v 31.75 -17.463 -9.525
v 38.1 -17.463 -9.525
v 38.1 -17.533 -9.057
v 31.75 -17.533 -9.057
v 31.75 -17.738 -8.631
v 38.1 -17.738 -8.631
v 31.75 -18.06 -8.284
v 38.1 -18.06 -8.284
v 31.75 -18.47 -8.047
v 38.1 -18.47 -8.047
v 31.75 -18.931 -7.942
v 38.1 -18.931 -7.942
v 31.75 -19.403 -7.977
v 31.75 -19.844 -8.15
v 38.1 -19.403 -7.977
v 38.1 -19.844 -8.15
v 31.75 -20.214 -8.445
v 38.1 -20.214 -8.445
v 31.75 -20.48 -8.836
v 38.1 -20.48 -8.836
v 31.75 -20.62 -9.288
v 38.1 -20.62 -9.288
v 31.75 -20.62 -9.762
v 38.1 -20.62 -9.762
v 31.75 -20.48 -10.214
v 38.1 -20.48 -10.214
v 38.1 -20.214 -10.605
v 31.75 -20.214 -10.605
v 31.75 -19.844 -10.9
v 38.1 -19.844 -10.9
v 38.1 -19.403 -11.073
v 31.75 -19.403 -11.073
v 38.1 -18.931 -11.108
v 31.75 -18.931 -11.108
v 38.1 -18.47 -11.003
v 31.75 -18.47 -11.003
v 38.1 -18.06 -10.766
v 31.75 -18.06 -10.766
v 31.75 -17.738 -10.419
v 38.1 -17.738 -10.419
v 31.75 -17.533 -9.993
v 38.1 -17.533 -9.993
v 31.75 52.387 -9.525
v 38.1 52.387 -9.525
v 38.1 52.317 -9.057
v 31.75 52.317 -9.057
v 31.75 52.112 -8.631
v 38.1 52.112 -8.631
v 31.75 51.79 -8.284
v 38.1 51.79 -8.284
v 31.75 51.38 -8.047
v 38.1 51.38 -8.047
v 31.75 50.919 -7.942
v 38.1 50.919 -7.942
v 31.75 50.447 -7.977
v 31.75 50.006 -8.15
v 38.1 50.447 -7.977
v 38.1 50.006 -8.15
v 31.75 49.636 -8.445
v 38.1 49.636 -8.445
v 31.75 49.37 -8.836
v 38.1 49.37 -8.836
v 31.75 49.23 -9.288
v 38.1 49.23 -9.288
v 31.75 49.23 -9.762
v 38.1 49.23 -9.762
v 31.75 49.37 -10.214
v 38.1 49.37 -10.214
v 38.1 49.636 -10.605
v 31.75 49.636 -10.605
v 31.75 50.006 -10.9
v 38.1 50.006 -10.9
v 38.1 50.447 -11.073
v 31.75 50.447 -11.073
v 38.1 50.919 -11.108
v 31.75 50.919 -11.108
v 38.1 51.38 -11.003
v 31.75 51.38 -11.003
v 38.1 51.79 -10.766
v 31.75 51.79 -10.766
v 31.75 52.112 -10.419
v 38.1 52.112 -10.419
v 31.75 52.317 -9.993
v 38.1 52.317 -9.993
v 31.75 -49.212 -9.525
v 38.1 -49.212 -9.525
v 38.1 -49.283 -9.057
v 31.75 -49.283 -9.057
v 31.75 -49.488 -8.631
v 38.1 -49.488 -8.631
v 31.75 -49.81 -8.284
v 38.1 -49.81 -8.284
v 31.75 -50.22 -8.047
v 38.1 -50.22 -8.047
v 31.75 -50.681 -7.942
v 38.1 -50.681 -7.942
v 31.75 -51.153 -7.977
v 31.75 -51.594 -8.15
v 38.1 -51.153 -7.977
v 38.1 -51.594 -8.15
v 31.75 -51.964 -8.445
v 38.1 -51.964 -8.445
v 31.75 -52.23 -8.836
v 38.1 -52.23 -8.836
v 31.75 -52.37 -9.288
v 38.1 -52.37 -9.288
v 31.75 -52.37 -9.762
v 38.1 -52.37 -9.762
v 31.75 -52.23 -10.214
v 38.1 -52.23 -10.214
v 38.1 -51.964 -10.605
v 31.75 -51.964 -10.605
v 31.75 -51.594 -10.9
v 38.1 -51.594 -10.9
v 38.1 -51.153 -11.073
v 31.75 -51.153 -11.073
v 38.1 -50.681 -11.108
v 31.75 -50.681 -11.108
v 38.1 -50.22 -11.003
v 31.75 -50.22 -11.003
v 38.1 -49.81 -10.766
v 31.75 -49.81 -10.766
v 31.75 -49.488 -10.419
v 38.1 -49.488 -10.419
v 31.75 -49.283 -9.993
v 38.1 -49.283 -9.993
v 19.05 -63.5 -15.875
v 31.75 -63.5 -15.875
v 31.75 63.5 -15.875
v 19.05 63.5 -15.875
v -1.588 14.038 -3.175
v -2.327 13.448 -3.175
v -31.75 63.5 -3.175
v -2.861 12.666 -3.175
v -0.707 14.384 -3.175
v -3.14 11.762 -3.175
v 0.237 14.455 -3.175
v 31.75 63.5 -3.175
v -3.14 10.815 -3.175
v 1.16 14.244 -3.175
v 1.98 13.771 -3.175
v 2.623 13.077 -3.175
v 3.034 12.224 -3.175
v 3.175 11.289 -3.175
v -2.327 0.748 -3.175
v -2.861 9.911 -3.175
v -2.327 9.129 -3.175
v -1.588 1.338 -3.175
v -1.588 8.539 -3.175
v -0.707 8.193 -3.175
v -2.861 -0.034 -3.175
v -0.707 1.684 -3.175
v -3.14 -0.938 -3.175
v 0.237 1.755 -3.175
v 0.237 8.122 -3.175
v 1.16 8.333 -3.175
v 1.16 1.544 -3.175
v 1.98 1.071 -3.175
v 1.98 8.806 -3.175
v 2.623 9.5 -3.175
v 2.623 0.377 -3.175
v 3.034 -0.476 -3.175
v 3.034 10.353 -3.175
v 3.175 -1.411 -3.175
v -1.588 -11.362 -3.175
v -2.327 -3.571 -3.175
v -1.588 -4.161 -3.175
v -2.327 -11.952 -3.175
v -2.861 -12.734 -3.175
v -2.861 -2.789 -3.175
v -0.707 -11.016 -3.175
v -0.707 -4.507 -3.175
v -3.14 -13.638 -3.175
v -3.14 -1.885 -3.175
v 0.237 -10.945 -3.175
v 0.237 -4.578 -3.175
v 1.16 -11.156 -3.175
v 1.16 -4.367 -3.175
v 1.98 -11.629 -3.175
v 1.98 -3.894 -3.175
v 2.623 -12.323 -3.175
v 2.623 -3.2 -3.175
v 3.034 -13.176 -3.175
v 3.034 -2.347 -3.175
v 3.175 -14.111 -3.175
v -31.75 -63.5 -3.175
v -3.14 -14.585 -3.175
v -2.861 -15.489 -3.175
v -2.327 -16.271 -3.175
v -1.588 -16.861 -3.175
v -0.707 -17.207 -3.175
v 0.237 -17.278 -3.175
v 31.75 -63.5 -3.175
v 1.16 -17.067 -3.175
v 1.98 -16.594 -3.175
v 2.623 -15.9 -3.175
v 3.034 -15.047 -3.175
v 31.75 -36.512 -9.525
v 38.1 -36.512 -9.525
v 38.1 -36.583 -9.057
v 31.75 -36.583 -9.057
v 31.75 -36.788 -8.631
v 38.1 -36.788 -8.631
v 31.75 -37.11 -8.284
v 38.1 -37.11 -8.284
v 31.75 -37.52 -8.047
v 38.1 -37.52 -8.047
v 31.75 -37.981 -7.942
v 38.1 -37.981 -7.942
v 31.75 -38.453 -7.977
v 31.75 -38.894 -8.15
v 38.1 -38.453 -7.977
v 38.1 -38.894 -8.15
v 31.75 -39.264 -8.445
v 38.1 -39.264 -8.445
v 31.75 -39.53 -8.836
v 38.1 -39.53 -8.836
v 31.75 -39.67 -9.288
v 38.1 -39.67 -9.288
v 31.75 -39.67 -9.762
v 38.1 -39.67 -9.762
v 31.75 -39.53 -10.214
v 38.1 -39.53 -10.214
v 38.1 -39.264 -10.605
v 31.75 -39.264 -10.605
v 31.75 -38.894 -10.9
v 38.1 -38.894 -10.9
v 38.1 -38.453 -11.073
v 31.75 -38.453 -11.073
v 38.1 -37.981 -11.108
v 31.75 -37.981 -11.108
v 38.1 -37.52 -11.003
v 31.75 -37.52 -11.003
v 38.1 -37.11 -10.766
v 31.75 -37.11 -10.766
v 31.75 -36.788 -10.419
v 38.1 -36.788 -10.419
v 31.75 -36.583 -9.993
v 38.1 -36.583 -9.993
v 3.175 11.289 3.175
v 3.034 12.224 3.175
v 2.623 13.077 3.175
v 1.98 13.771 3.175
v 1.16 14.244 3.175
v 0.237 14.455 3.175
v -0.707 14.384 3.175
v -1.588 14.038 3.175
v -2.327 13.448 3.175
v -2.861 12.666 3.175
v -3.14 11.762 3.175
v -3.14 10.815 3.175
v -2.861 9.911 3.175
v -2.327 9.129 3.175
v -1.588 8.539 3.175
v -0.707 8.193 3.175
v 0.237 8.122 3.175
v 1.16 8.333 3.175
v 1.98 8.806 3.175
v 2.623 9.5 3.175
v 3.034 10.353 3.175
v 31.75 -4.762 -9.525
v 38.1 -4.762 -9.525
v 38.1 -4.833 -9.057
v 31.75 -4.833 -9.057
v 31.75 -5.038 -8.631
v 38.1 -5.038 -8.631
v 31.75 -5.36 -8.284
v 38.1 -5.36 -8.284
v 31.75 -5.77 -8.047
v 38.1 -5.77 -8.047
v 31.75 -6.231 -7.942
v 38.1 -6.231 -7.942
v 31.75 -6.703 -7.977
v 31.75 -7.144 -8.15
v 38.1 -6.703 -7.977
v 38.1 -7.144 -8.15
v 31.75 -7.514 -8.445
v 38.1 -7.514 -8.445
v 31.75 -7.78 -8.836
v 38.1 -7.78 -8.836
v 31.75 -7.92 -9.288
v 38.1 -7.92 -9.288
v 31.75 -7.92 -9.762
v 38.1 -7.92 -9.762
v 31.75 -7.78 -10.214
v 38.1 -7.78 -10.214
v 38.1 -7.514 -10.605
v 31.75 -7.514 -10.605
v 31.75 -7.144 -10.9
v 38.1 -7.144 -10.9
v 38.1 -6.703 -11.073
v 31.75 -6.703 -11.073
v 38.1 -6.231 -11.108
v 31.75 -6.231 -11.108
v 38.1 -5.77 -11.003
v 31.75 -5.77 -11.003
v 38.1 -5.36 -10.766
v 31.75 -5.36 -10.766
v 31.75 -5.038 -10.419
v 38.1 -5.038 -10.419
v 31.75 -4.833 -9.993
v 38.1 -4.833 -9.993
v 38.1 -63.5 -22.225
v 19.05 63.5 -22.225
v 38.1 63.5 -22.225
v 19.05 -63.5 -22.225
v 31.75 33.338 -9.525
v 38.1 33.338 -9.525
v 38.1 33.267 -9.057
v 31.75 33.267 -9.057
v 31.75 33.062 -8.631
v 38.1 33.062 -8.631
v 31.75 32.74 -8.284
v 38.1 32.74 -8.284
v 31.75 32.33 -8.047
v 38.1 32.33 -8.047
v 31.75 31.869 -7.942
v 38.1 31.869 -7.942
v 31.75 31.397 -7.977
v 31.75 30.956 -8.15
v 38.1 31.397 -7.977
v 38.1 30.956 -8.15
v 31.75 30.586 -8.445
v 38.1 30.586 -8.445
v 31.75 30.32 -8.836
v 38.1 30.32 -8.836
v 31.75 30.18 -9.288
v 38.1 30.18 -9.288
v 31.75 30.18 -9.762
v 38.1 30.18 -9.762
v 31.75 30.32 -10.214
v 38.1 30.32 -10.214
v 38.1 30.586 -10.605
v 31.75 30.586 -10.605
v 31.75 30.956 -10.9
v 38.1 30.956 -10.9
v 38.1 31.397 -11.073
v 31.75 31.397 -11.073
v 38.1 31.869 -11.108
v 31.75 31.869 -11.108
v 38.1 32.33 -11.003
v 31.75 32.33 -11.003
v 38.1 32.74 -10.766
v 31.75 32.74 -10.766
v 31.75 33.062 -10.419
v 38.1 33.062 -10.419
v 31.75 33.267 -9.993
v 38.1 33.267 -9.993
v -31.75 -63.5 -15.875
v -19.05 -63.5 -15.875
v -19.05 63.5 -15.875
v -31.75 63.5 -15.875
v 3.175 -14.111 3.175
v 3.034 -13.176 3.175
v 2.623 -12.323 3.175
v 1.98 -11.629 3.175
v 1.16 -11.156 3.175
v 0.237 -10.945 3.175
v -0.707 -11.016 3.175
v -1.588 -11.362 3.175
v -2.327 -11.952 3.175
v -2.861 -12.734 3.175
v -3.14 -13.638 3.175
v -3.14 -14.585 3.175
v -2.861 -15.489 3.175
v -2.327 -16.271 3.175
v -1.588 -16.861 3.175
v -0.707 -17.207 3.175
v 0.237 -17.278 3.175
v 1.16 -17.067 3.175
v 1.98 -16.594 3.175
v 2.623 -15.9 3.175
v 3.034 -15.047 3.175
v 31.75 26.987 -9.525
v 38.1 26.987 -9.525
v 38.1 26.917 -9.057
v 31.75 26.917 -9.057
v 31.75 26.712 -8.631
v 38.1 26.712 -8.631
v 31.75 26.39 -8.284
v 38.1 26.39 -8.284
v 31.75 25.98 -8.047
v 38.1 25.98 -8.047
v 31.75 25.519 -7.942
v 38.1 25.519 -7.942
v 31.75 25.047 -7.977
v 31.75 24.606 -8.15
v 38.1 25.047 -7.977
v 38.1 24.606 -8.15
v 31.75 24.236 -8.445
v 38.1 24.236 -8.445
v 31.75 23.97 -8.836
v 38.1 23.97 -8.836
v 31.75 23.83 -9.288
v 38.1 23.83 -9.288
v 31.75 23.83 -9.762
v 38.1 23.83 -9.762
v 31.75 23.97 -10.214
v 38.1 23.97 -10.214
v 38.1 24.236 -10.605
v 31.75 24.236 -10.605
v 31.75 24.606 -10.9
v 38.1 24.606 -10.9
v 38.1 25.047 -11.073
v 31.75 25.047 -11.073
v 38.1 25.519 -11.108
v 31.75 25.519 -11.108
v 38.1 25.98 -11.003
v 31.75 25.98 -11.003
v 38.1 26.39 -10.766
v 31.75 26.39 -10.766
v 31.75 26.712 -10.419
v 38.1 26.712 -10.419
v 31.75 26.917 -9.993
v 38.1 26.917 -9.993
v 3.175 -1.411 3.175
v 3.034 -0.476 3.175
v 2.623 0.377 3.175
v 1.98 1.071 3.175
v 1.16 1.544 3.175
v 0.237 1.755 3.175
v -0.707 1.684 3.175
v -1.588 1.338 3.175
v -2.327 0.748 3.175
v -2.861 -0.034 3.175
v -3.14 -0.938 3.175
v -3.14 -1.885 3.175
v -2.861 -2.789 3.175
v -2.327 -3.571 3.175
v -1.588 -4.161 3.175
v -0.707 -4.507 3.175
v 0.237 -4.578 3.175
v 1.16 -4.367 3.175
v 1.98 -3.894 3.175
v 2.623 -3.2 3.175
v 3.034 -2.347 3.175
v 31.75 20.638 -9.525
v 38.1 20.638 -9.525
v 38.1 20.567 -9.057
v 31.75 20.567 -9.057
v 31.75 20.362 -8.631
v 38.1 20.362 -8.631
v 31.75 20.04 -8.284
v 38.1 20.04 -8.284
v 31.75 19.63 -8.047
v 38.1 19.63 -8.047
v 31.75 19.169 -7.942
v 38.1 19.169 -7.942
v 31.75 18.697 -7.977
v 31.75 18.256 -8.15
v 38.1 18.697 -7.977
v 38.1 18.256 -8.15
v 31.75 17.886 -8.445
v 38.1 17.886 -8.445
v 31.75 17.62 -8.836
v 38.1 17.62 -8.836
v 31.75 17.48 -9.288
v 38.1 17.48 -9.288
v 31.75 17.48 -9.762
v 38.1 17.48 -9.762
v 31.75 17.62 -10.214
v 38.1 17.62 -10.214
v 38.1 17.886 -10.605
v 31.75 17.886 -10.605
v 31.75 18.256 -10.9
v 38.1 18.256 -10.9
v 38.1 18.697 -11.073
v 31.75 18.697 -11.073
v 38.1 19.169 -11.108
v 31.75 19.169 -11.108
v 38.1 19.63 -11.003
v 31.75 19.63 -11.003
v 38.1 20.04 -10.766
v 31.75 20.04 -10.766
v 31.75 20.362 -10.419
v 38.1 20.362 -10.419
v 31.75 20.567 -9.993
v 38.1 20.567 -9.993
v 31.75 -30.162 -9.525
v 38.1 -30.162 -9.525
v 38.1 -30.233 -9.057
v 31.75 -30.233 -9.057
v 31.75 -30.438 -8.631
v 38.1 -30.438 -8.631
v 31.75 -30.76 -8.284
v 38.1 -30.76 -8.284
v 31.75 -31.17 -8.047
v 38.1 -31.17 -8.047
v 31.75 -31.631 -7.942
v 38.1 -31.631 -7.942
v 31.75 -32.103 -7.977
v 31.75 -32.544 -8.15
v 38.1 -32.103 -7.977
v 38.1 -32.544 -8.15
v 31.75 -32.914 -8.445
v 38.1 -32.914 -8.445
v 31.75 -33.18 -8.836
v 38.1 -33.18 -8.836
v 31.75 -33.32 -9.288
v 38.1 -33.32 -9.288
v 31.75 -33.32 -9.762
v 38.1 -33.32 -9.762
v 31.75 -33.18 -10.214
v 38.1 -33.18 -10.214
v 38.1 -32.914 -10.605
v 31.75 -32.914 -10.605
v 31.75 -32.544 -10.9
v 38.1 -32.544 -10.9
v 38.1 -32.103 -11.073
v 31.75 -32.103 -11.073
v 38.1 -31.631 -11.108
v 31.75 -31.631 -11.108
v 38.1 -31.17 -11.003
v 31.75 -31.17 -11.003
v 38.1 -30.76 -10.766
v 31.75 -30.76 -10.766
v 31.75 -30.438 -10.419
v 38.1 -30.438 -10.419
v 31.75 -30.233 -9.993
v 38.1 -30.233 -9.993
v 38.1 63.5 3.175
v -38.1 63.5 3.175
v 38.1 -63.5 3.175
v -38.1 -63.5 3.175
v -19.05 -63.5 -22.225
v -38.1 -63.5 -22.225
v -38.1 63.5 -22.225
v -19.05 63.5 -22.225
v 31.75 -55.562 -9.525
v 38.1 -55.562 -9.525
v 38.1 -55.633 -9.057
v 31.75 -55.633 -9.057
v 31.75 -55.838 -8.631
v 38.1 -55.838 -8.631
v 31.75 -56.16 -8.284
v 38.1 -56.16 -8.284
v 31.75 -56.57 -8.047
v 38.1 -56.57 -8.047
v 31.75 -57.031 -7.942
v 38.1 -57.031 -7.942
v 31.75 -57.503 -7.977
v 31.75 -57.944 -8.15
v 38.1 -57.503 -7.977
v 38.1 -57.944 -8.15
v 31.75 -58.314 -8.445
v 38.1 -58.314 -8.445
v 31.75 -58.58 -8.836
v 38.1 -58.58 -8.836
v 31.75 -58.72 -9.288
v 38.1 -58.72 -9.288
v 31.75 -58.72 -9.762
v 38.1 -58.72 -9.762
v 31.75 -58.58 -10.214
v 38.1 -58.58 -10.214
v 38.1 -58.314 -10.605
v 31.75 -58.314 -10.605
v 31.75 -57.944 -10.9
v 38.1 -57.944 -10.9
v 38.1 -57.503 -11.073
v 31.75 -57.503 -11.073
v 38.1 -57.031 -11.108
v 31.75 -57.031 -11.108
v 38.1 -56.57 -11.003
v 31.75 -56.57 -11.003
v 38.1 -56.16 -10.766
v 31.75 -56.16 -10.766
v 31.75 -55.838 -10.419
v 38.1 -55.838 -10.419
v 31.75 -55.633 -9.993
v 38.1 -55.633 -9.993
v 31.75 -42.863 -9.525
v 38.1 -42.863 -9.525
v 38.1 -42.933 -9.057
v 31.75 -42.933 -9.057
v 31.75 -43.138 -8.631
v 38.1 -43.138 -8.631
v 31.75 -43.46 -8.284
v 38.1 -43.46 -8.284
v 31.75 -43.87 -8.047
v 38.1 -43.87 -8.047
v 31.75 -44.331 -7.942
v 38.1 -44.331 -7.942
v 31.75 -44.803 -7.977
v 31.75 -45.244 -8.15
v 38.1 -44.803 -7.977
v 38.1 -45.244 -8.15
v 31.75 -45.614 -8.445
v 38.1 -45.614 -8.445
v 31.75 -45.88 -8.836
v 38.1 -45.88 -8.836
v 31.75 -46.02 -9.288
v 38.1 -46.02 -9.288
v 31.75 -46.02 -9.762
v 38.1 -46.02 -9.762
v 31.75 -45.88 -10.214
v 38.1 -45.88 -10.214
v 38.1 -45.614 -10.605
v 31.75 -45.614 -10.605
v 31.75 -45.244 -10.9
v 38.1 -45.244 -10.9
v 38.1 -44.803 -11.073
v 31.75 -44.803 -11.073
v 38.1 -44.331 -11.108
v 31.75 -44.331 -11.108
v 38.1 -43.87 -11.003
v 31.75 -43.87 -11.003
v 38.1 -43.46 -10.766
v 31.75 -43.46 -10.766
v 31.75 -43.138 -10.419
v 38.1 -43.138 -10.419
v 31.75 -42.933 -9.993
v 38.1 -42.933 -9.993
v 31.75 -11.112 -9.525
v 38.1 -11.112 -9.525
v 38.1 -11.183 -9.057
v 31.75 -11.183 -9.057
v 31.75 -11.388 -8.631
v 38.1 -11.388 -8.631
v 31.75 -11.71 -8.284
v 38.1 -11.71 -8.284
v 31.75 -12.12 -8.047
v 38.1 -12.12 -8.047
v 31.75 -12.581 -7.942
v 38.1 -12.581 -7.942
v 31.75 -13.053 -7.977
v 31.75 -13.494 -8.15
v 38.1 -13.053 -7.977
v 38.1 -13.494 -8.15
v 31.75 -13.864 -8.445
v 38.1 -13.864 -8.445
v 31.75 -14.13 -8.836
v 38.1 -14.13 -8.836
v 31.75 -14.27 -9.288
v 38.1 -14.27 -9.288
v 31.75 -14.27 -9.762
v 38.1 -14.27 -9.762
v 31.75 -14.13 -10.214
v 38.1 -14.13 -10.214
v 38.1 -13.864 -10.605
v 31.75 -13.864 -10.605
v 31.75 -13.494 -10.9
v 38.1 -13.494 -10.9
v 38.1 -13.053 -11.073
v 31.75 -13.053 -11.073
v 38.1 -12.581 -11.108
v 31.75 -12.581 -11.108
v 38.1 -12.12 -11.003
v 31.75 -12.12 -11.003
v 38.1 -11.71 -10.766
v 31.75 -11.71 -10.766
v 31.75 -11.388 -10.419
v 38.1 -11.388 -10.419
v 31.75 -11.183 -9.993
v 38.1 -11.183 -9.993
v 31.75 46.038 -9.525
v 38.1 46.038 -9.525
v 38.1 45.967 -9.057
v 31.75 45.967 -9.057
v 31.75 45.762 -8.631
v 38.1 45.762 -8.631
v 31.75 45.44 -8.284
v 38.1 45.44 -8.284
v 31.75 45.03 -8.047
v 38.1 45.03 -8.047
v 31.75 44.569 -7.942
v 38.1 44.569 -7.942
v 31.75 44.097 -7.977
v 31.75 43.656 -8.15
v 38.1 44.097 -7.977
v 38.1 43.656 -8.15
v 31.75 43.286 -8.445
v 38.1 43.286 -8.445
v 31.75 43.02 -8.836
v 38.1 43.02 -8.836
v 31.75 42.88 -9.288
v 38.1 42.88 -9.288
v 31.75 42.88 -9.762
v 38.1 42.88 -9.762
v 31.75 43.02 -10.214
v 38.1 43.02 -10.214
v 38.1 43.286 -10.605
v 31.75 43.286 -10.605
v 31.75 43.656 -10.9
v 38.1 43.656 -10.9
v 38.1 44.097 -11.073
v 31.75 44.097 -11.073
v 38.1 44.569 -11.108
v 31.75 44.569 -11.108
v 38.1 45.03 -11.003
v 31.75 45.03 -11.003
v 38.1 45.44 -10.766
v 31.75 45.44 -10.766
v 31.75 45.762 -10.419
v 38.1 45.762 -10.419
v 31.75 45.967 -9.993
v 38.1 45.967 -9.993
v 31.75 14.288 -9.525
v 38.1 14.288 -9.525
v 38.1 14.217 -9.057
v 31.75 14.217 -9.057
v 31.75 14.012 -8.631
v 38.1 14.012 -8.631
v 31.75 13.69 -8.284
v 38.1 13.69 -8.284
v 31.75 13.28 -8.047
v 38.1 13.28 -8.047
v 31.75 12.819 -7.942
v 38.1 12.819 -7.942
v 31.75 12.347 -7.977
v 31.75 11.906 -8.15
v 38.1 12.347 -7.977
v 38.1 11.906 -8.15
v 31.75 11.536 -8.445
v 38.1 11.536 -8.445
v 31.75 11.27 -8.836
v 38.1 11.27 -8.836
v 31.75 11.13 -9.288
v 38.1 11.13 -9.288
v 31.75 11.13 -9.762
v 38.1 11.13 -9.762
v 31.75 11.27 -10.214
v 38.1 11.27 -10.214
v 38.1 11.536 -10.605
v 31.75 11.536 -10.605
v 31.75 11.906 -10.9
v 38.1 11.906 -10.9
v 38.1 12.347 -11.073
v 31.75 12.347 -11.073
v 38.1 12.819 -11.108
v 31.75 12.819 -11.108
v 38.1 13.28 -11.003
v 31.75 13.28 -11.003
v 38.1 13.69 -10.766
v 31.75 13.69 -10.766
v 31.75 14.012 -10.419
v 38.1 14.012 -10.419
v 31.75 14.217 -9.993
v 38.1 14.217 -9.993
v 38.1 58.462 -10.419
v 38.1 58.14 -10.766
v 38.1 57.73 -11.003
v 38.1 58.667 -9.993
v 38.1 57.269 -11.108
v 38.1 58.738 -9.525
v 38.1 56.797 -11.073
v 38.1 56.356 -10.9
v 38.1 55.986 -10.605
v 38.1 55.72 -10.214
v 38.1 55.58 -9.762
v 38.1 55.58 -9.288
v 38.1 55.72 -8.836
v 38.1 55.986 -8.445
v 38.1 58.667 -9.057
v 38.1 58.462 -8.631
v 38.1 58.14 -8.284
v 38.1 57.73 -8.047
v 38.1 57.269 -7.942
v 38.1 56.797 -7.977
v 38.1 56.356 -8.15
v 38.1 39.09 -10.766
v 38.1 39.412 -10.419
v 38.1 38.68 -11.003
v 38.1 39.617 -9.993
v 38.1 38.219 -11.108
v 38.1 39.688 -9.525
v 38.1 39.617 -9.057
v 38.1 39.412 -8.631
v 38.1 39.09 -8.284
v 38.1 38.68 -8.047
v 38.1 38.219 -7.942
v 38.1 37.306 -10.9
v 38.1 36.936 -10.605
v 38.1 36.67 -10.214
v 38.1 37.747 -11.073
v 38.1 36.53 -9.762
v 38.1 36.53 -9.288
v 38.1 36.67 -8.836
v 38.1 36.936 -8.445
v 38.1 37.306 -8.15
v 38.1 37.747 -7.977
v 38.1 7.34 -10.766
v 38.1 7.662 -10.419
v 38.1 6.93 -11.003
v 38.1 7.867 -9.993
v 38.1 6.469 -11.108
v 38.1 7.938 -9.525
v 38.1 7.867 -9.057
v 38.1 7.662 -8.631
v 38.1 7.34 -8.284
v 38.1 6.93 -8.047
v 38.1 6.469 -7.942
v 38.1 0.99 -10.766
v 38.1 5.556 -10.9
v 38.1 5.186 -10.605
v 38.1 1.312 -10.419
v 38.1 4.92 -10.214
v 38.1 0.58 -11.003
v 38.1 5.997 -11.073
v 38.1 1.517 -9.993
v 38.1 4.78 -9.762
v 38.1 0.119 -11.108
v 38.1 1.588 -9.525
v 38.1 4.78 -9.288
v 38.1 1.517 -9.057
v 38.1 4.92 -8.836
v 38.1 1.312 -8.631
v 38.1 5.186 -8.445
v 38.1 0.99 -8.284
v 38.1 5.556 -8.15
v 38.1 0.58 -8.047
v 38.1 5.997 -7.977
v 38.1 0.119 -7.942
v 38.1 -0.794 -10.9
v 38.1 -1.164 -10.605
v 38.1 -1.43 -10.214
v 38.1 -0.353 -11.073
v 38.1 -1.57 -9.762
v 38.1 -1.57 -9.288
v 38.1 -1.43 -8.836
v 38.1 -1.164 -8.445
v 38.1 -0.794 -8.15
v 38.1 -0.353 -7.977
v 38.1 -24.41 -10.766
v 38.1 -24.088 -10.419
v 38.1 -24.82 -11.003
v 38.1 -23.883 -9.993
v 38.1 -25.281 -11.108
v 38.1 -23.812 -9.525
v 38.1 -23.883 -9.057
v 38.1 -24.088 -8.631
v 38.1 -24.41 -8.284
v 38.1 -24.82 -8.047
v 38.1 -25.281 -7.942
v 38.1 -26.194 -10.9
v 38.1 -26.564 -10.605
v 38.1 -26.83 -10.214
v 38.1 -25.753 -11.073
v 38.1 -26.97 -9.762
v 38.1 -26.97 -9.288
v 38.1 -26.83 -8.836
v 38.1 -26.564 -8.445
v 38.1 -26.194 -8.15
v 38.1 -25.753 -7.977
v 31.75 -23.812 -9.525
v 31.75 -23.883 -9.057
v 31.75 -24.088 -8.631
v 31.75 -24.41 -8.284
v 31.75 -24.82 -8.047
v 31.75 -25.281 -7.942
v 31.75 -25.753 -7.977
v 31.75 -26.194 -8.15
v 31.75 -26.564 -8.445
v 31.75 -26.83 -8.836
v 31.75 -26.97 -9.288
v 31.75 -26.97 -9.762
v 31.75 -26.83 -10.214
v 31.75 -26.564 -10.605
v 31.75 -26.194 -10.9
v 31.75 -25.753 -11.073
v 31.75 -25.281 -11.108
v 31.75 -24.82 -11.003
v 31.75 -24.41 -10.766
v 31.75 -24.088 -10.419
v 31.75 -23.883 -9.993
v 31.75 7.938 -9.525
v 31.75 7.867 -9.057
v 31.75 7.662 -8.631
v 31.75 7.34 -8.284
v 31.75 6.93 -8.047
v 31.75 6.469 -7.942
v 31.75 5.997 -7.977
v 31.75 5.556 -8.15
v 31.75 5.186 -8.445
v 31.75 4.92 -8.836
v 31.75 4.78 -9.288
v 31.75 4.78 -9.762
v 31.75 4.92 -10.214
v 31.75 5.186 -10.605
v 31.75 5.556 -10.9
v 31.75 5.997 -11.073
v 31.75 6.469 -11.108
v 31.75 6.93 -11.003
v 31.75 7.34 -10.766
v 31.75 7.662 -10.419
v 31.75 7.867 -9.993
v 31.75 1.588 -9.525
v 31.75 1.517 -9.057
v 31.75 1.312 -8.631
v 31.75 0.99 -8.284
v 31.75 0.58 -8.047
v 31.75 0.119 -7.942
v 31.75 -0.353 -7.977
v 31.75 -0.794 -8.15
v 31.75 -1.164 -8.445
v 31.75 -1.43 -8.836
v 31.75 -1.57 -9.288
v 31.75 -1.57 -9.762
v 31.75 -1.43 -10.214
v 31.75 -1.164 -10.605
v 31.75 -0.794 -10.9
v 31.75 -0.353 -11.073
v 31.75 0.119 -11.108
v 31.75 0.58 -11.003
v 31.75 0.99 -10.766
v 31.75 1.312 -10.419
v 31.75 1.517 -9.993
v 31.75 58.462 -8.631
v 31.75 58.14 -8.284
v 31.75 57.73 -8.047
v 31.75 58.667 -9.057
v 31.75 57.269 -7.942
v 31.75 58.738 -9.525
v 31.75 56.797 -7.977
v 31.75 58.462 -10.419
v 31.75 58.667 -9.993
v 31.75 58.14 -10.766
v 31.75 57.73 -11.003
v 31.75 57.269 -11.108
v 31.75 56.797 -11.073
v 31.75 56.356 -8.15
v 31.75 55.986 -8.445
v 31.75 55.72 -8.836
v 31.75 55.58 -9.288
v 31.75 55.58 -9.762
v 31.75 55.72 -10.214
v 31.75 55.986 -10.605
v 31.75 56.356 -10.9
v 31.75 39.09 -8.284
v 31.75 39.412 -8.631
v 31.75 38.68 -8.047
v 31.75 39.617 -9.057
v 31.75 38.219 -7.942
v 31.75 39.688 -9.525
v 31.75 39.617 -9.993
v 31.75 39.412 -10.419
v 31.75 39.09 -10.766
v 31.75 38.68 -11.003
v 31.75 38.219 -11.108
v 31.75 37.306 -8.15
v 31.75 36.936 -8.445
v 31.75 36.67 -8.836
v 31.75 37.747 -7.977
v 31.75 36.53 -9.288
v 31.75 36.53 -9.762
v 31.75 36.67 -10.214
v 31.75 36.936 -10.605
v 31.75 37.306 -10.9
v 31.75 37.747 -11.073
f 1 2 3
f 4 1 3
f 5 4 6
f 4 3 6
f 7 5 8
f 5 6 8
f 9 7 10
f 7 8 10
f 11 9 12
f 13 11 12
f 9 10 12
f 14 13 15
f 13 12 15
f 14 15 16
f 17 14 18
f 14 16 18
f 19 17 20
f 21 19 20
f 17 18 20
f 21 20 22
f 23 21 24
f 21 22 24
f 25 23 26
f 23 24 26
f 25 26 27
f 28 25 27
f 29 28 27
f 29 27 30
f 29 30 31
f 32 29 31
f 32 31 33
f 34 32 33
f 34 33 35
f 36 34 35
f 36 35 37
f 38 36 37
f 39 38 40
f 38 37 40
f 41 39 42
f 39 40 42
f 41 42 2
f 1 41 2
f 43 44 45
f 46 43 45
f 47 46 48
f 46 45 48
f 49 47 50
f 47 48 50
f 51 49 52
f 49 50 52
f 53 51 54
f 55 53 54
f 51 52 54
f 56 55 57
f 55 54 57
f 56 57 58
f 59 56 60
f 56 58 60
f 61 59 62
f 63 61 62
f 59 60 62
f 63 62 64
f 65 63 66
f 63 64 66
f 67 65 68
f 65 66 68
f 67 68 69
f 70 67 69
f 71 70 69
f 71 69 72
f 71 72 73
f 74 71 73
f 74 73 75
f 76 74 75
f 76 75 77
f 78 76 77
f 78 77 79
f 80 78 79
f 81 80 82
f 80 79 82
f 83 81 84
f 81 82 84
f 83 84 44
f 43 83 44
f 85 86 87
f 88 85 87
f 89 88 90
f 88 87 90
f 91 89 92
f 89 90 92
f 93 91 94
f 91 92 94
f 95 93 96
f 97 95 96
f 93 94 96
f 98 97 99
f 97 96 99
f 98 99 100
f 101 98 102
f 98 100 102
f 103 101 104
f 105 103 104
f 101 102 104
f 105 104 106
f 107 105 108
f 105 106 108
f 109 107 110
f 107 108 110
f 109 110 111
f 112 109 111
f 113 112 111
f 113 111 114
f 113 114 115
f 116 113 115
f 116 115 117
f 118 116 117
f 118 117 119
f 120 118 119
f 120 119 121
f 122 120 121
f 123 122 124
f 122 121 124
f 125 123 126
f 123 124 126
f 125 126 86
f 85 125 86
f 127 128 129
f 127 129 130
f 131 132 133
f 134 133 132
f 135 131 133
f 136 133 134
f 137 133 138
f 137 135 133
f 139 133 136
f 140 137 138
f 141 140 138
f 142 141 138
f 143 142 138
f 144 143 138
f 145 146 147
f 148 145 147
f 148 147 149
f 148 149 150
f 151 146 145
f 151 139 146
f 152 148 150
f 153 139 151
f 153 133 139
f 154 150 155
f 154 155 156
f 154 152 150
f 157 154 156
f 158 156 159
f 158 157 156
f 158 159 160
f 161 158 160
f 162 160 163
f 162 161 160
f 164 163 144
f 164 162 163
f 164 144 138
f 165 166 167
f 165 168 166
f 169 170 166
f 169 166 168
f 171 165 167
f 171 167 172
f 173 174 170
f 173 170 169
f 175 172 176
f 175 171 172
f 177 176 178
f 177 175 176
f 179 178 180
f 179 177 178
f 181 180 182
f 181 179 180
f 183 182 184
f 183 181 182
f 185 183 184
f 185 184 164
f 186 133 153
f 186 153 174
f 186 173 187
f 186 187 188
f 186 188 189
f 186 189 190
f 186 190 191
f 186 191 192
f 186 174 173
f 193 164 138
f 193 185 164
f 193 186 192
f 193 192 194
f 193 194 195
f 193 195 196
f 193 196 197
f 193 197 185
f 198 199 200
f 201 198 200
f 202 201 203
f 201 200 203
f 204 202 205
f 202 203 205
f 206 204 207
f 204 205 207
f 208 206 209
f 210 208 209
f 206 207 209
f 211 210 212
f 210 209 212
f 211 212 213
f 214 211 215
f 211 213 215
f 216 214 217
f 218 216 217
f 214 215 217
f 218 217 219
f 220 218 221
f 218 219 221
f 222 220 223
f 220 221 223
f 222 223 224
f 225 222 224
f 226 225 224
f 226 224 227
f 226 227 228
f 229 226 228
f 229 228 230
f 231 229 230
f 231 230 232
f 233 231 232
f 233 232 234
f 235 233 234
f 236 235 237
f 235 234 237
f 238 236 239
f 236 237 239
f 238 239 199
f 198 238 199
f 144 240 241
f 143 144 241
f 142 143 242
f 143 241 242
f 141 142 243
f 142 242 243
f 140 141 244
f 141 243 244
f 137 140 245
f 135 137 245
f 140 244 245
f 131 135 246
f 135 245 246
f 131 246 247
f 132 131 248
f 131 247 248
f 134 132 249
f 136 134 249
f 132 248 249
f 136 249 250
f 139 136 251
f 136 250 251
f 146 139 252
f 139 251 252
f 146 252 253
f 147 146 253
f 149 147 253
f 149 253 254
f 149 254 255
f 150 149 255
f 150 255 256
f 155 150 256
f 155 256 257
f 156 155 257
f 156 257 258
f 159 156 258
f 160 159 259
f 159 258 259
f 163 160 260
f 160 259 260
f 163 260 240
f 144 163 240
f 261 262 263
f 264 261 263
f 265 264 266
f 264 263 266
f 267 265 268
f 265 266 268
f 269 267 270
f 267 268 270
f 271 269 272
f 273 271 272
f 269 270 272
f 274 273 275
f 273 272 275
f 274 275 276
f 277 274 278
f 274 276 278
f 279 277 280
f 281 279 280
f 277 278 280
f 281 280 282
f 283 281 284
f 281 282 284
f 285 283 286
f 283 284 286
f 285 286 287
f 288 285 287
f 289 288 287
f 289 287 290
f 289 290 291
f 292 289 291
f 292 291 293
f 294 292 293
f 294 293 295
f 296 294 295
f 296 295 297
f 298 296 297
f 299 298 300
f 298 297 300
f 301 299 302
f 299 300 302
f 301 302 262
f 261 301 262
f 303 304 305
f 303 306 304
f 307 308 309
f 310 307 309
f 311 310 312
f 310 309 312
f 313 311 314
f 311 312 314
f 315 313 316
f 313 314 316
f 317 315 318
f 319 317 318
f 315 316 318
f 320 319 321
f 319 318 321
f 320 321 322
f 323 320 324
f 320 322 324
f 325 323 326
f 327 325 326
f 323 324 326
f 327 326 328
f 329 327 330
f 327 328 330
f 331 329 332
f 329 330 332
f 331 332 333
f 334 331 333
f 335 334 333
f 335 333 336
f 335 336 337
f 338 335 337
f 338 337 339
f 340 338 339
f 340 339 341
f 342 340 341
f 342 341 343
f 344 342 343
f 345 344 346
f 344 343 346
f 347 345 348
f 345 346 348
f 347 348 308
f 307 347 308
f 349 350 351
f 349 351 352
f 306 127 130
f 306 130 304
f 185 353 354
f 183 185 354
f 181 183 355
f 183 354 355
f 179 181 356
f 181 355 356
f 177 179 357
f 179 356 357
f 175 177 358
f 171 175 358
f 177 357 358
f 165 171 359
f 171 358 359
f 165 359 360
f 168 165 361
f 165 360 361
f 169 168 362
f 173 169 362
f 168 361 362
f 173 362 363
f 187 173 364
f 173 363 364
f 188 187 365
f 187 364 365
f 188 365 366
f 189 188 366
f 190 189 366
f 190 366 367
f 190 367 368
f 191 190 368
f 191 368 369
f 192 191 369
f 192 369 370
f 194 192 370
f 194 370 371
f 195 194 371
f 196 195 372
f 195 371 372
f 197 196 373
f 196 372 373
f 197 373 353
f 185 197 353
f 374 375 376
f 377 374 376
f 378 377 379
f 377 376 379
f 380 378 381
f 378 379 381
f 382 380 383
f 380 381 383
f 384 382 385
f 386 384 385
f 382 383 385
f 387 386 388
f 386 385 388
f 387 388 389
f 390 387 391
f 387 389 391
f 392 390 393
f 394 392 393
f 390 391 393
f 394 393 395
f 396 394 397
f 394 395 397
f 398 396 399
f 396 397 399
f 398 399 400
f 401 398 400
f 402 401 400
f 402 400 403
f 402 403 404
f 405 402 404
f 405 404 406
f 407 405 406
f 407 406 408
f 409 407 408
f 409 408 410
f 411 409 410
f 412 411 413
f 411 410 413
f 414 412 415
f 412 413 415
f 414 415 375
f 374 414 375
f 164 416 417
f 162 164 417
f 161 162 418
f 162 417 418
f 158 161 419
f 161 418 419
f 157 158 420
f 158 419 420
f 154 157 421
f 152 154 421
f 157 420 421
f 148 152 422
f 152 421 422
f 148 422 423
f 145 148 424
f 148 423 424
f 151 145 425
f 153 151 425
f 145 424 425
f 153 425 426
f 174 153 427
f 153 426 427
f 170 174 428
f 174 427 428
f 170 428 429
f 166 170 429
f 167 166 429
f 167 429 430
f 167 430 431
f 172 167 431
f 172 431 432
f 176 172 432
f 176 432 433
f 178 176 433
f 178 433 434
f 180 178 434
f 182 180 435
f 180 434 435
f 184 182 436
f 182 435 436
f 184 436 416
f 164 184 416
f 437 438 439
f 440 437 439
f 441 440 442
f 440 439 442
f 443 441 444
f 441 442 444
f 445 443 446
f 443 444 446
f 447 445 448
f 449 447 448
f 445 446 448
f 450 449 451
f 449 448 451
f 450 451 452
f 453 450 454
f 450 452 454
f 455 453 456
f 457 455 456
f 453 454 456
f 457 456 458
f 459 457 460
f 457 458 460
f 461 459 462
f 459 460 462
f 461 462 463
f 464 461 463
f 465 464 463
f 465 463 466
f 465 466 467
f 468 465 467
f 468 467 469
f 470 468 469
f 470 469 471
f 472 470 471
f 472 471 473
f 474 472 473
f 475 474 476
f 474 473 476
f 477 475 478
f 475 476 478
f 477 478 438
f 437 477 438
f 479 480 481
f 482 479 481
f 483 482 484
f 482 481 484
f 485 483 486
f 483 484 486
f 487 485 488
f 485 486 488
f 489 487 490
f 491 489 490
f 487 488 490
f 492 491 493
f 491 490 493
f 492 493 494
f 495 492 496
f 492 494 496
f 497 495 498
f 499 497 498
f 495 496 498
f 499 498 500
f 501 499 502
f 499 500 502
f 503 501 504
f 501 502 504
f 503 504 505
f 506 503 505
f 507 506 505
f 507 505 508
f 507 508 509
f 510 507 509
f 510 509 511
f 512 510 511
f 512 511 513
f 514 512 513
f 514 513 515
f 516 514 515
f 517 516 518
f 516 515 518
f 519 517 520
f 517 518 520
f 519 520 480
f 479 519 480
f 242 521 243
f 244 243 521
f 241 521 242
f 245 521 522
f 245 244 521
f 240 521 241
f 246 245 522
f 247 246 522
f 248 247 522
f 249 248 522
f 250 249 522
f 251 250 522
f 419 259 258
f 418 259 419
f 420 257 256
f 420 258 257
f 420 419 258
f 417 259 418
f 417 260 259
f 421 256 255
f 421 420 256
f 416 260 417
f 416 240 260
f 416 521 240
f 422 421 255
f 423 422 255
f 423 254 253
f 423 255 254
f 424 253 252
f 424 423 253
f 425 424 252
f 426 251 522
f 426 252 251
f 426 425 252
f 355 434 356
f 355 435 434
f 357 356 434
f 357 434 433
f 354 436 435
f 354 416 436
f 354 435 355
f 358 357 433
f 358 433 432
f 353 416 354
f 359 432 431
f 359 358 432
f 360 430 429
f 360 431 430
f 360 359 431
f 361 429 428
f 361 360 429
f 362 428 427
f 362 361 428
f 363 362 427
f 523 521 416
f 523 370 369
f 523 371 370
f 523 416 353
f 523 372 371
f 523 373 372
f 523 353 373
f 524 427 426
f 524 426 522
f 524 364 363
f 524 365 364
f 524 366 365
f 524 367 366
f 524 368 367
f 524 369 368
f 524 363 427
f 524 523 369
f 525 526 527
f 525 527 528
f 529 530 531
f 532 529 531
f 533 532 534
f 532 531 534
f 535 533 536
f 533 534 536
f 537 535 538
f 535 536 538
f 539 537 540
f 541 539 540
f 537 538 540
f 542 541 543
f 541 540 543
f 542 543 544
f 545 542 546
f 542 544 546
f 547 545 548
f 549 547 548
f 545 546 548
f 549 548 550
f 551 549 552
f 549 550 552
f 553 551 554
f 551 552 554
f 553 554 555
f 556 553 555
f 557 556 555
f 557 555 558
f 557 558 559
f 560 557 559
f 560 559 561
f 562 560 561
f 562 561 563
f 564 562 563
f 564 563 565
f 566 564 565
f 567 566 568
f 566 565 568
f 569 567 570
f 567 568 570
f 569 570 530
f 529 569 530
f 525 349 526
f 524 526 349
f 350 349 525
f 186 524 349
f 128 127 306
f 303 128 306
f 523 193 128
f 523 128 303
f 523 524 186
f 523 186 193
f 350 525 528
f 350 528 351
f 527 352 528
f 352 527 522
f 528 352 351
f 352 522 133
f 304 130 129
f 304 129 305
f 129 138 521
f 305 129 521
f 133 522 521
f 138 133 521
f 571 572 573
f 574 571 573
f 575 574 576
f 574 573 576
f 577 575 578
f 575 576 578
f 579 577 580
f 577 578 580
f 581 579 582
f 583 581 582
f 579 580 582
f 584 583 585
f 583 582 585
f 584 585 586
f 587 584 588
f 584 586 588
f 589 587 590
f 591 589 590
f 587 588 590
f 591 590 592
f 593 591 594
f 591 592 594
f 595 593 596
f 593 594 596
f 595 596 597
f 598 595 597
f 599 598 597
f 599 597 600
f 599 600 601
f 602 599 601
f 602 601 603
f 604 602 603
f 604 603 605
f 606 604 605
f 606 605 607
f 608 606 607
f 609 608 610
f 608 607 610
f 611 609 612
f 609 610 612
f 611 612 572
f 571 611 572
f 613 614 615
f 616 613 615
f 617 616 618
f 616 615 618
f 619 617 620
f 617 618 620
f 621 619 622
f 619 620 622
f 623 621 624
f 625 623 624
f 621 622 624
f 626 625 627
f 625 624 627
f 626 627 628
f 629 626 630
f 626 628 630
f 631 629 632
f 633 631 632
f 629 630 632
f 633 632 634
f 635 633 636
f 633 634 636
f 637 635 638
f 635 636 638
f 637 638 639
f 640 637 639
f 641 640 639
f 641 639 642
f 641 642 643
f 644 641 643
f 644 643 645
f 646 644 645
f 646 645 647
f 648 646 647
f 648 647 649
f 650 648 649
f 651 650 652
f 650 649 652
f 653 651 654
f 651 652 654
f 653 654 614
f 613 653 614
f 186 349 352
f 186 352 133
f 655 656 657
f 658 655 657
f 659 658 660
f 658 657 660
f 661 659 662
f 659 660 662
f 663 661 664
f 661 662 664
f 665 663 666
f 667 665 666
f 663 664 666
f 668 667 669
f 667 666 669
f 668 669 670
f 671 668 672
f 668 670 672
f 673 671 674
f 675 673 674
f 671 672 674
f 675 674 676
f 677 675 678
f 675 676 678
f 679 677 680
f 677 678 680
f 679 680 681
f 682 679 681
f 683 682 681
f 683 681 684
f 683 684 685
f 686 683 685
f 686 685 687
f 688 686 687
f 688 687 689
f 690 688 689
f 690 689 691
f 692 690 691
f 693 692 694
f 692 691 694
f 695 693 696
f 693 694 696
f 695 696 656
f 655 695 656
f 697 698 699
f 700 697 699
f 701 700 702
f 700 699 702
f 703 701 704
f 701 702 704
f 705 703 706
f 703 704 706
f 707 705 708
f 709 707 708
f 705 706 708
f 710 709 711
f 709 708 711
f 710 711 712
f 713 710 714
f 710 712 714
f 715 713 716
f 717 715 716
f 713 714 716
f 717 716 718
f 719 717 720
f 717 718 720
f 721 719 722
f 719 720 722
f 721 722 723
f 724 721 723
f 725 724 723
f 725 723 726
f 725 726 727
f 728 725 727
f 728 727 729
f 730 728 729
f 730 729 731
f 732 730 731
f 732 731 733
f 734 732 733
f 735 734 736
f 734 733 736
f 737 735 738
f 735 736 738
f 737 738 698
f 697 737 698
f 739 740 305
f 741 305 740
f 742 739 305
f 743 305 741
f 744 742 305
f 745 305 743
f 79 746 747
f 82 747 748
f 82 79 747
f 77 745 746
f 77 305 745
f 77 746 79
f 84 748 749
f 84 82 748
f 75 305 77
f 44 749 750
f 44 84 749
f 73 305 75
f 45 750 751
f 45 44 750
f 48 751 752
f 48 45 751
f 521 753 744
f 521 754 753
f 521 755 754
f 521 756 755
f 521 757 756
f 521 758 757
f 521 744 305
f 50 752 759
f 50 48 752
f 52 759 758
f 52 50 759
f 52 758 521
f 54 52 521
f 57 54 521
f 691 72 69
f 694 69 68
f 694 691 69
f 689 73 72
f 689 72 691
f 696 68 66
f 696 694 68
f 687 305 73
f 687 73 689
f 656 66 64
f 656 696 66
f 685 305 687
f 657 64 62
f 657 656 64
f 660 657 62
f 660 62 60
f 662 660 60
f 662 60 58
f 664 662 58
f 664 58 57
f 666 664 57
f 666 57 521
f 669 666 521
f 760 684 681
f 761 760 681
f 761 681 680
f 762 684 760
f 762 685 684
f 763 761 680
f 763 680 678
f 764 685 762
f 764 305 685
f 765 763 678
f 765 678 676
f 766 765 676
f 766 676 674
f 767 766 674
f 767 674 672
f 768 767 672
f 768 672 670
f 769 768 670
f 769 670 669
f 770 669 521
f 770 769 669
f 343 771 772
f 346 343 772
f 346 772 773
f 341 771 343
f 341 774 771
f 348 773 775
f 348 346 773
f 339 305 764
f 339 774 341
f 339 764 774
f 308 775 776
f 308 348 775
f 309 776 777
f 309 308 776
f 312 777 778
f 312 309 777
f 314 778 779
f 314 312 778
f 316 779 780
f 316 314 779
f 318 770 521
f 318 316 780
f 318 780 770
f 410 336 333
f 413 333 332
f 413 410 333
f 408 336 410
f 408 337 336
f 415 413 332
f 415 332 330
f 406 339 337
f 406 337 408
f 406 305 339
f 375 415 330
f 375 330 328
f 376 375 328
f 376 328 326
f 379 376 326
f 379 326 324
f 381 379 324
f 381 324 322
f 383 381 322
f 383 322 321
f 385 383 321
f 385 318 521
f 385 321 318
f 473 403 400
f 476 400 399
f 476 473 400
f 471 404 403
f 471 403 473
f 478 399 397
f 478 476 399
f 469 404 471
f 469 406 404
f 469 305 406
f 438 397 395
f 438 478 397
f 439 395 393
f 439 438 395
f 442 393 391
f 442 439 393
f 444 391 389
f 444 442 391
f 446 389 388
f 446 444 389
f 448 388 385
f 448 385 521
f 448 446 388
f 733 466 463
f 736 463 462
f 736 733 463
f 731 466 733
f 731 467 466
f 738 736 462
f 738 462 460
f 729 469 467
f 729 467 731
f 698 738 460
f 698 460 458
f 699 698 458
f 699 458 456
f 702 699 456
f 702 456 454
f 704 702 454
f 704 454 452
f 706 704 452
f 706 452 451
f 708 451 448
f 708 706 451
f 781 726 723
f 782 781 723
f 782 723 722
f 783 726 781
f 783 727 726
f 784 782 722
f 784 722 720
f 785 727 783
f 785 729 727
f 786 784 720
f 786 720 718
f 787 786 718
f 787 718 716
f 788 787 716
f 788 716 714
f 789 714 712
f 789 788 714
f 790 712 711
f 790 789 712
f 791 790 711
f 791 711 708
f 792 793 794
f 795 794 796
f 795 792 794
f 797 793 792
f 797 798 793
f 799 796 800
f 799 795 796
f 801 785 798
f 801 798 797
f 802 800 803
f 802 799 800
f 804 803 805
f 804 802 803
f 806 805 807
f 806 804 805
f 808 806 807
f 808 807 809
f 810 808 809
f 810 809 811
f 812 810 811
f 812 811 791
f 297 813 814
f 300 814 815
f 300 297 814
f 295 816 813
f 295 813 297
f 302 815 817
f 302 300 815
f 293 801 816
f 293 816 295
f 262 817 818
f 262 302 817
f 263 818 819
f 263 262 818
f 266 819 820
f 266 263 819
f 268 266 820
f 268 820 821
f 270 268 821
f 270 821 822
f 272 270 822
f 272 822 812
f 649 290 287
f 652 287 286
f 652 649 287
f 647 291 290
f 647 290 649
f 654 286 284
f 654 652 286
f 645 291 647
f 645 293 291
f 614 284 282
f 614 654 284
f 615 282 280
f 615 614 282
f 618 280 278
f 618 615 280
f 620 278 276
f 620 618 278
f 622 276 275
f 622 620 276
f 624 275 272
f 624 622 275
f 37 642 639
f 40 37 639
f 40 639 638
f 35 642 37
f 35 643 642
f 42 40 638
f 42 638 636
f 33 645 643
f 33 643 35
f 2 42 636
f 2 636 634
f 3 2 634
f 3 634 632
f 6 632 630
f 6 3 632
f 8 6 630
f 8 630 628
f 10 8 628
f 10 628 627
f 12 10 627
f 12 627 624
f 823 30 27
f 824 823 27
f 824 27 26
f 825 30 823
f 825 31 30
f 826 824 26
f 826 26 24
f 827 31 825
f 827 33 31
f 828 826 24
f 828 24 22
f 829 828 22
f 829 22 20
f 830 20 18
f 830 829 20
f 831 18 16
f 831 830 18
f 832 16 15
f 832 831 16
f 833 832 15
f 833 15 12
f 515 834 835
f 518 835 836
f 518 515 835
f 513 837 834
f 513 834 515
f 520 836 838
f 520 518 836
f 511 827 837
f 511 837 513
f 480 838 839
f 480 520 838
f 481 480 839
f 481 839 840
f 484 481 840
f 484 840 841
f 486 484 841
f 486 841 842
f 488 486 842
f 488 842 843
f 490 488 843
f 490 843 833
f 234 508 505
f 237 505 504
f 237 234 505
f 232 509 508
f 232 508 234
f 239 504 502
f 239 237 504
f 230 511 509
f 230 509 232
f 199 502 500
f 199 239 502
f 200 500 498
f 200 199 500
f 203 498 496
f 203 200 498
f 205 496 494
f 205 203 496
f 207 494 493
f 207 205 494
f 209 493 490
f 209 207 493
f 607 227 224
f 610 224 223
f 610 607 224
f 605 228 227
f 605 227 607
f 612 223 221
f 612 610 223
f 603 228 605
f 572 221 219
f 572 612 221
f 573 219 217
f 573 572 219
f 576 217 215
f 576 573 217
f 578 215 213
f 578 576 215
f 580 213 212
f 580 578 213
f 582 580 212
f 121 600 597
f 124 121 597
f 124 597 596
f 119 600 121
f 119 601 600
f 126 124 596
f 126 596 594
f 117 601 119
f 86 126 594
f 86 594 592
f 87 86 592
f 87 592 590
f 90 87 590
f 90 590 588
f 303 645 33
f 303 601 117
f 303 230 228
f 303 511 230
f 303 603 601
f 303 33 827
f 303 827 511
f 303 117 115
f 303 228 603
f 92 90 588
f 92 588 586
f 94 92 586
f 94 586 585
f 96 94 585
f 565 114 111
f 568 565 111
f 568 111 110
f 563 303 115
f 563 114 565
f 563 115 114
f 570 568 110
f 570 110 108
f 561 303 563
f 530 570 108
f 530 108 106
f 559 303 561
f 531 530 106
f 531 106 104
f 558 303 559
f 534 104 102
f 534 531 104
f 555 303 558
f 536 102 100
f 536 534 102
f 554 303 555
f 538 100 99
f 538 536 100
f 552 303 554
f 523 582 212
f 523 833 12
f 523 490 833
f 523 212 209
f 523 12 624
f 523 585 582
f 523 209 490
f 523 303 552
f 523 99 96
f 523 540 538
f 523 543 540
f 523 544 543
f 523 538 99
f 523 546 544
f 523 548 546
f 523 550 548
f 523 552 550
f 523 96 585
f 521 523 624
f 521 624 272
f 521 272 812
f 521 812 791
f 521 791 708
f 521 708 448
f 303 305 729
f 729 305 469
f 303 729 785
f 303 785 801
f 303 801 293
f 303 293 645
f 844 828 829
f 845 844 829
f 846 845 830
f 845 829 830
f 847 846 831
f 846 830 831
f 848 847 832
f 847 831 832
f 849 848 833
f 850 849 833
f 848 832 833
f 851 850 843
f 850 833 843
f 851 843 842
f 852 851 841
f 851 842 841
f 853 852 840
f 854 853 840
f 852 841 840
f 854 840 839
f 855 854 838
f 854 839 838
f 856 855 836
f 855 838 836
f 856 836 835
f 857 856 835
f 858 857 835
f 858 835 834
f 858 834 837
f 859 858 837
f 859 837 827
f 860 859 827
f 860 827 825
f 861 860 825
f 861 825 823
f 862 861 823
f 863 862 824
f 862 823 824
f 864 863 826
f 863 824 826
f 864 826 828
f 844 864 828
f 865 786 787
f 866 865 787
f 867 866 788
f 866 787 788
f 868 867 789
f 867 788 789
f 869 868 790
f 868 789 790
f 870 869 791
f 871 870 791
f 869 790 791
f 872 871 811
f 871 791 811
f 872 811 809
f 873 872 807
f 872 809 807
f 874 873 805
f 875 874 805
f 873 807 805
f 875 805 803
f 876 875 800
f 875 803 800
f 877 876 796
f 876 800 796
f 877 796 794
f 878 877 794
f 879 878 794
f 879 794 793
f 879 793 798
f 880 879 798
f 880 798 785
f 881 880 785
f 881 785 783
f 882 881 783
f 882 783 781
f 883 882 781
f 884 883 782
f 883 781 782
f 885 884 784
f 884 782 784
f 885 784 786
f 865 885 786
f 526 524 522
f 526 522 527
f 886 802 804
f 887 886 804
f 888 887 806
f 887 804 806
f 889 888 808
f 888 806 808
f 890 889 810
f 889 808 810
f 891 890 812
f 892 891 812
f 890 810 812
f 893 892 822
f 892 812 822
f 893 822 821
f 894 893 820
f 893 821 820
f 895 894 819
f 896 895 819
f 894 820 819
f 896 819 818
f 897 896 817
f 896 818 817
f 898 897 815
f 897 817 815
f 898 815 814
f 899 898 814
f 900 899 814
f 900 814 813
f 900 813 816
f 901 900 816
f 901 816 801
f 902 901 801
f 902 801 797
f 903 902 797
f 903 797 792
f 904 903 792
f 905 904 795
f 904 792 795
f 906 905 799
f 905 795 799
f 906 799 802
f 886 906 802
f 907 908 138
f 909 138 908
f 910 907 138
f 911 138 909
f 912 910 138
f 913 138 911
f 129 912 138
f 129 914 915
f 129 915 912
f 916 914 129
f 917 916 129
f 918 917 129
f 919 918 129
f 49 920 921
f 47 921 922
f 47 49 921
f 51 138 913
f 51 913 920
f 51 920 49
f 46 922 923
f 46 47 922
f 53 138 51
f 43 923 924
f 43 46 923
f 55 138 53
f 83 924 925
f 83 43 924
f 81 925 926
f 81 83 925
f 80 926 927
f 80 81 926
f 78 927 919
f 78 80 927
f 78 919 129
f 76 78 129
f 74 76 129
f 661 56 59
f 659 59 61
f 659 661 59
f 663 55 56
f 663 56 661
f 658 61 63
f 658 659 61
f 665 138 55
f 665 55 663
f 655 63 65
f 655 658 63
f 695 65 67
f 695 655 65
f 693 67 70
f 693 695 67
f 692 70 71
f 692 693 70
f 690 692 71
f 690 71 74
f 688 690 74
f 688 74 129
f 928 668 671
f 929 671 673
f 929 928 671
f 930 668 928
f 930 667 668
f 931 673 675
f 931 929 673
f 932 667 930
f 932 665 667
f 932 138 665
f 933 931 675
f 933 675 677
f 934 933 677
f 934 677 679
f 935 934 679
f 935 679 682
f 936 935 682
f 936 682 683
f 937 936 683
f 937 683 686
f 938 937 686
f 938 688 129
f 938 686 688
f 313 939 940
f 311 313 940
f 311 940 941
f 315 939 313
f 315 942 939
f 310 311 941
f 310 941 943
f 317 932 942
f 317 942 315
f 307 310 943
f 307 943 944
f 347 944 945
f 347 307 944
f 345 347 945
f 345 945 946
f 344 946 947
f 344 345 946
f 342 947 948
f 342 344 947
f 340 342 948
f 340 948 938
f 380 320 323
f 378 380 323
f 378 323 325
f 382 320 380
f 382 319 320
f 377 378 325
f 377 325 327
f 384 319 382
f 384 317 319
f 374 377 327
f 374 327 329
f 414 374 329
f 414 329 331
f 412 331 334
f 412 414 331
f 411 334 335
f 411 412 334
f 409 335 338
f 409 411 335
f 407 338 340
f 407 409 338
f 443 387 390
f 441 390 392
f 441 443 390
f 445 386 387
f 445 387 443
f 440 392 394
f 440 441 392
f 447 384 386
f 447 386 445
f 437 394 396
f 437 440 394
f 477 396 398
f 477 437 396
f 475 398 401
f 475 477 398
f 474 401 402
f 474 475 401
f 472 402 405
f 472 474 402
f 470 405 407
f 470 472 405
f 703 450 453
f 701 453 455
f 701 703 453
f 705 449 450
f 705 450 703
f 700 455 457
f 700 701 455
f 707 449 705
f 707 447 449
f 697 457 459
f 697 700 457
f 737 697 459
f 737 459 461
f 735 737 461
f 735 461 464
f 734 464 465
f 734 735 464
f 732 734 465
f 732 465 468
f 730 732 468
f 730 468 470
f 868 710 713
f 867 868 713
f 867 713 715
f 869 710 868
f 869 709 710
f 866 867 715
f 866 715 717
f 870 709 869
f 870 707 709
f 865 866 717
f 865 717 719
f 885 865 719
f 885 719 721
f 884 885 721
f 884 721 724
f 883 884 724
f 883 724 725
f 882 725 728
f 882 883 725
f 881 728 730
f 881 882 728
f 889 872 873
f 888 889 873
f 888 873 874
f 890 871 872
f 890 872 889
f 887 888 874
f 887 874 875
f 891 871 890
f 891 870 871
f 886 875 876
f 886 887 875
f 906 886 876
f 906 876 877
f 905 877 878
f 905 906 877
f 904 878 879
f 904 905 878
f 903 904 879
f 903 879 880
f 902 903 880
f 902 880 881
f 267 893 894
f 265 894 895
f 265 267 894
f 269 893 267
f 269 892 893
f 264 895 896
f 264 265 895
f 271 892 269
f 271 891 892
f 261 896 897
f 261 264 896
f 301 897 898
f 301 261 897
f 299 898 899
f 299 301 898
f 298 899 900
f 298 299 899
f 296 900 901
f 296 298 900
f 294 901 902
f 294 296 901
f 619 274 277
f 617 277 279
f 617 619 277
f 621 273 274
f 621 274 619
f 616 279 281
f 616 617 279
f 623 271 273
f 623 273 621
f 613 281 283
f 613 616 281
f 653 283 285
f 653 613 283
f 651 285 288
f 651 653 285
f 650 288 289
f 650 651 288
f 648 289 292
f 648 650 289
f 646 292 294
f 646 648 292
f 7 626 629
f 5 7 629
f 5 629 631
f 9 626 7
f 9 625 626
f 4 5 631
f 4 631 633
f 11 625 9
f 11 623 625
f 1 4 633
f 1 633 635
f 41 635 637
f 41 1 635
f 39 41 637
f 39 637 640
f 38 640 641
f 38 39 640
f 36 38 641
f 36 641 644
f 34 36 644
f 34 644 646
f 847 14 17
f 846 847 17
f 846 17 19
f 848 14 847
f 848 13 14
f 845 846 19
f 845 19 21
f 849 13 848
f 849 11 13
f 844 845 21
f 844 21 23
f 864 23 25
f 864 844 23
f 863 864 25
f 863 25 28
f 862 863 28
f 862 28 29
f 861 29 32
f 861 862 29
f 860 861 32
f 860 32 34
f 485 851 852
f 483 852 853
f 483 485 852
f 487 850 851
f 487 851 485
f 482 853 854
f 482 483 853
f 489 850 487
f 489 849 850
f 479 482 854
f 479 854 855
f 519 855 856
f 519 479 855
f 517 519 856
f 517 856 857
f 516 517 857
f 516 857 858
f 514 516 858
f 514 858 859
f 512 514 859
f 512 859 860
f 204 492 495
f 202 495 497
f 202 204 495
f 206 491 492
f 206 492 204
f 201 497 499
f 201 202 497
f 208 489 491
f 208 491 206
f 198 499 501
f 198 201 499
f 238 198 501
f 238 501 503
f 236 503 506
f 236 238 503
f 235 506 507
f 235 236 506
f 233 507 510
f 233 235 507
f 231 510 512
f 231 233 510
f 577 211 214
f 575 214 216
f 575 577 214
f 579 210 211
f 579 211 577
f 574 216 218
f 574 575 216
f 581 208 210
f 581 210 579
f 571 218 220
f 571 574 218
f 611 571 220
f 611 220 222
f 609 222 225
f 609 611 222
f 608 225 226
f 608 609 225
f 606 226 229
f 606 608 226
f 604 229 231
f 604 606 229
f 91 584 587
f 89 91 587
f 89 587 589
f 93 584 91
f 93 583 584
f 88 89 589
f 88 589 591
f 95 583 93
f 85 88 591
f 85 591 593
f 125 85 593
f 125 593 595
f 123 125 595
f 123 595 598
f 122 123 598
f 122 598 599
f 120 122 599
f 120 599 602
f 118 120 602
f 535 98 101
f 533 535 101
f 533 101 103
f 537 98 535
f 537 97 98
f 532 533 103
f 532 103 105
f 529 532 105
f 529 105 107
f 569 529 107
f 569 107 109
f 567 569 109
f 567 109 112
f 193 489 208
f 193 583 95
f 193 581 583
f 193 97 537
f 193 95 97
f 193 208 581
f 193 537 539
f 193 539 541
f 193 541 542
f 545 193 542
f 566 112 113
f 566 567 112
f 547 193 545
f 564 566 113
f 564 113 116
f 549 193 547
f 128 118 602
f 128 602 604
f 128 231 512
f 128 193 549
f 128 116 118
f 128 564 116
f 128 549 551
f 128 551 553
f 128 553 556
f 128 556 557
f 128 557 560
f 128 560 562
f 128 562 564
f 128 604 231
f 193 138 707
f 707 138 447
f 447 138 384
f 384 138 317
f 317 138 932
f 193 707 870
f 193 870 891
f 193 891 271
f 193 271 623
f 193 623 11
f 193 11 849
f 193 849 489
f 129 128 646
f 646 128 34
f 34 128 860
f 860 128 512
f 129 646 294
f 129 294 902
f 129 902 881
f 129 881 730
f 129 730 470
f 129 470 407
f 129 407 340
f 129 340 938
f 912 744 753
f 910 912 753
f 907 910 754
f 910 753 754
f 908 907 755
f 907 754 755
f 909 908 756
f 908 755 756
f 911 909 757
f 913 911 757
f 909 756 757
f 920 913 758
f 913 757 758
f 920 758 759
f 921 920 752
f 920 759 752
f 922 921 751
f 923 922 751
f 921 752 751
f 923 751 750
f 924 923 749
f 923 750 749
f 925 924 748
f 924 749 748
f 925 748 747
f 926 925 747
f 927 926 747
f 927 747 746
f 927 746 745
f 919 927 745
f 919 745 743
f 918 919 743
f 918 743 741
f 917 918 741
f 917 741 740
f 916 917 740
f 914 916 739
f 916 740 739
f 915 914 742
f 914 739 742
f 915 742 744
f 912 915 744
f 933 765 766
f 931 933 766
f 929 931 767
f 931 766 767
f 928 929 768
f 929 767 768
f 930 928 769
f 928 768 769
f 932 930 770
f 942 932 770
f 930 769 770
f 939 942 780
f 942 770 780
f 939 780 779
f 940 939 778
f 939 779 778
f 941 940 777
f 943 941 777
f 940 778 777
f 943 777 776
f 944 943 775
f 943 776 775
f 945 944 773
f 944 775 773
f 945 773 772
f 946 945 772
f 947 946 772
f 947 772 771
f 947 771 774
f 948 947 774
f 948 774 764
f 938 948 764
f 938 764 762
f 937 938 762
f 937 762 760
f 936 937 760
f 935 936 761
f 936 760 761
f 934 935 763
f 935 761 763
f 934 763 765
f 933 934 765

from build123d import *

# Parameters (mm, degrees)
F1_DEPTH = 63.5
F3_R     = 1.5875
F4_DEPTH = 6.35
F2_R     = 3.175
F5_DEPTH = 6.35
F6_DEPTH = 6.35


# Not quite as in the source:
# - a feature names something its author has since deleted; it is built from what else it names


with BuildPart() as f1:
    # F0 (on Front) → F1 (new body, symmetric)
    with BuildSketch(Plane.XZ):
        Polygon((38.1, 3.175), (31.75, 3.175), (-31.75, 3.175), (-38.1, 3.175), (-38.1, -22.225), (-19.05, -22.225), (-19.05, -15.875), (-31.75, -15.875), (-31.75, -3.175), (31.75, -3.175), (31.75, -15.875), (19.05, -15.875), (19.05, -22.225), (38.1, -22.225), align=None)
    extrude(amount=F1_DEPTH, both=True)

    # F3 (on face) → F4 (cut)
    with BuildSketch(Plane.YZ.offset(38.1)):
        with Locations((-57.15, -9.525)):
            Circle(F3_R)
        with Locations((-50.8, -9.525)):
            Circle(F3_R)
        with Locations((-44.45, -9.525)):
            Circle(F3_R)
        with Locations((-38.1, -9.525)):
            Circle(F3_R)
        with Locations((-31.75, -9.525)):
            Circle(F3_R)
        with Locations((-25.4, -9.525)):
            Circle(F3_R)
        with Locations((-19.05, -9.525)):
            Circle(F3_R)
        with Locations((-12.7, -9.525)):
            Circle(F3_R)
        with Locations((-6.35, -9.525)):
            Circle(F3_R)
        with Locations((0, -9.525)):
            Circle(F3_R)
        with Locations((6.35, -9.525)):
            Circle(F3_R)
    extrude(amount=-F4_DEPTH, mode=Mode.SUBTRACT)

    # F2 (on face) → F5 (cut)
    with BuildSketch(Plane.XY.offset(3.175)):
        with Locations((0, 11.2886031434)):
            Circle(F2_R)
        with Locations((0, -1.4113968566)):
            Circle(F2_R)
        with Locations((0, -14.1113968566)):
            Circle(F2_R)
    extrude(amount=-F5_DEPTH, mode=Mode.SUBTRACT)

    # F3 (on face) → F6 (cut)
    with BuildSketch(Plane.YZ.offset(38.1)):
        with Locations((12.7, -9.525)):
            Circle(F3_R)
        with Locations((19.05, -9.525)):
            Circle(F3_R)
        with Locations((25.4, -9.525)):
            Circle(F3_R)
        with Locations((31.75, -9.525)):
            Circle(F3_R)
        with Locations((38.1, -9.525)):
            Circle(F3_R)
        with Locations((44.45, -9.525)):
            Circle(F3_R)
        with Locations((50.8, -9.525)):
            Circle(F3_R)
        with Locations((57.15, -9.525)):
            Circle(F3_R)
    extrude(amount=-F6_DEPTH, mode=Mode.SUBTRACT)


solid = f1.part
